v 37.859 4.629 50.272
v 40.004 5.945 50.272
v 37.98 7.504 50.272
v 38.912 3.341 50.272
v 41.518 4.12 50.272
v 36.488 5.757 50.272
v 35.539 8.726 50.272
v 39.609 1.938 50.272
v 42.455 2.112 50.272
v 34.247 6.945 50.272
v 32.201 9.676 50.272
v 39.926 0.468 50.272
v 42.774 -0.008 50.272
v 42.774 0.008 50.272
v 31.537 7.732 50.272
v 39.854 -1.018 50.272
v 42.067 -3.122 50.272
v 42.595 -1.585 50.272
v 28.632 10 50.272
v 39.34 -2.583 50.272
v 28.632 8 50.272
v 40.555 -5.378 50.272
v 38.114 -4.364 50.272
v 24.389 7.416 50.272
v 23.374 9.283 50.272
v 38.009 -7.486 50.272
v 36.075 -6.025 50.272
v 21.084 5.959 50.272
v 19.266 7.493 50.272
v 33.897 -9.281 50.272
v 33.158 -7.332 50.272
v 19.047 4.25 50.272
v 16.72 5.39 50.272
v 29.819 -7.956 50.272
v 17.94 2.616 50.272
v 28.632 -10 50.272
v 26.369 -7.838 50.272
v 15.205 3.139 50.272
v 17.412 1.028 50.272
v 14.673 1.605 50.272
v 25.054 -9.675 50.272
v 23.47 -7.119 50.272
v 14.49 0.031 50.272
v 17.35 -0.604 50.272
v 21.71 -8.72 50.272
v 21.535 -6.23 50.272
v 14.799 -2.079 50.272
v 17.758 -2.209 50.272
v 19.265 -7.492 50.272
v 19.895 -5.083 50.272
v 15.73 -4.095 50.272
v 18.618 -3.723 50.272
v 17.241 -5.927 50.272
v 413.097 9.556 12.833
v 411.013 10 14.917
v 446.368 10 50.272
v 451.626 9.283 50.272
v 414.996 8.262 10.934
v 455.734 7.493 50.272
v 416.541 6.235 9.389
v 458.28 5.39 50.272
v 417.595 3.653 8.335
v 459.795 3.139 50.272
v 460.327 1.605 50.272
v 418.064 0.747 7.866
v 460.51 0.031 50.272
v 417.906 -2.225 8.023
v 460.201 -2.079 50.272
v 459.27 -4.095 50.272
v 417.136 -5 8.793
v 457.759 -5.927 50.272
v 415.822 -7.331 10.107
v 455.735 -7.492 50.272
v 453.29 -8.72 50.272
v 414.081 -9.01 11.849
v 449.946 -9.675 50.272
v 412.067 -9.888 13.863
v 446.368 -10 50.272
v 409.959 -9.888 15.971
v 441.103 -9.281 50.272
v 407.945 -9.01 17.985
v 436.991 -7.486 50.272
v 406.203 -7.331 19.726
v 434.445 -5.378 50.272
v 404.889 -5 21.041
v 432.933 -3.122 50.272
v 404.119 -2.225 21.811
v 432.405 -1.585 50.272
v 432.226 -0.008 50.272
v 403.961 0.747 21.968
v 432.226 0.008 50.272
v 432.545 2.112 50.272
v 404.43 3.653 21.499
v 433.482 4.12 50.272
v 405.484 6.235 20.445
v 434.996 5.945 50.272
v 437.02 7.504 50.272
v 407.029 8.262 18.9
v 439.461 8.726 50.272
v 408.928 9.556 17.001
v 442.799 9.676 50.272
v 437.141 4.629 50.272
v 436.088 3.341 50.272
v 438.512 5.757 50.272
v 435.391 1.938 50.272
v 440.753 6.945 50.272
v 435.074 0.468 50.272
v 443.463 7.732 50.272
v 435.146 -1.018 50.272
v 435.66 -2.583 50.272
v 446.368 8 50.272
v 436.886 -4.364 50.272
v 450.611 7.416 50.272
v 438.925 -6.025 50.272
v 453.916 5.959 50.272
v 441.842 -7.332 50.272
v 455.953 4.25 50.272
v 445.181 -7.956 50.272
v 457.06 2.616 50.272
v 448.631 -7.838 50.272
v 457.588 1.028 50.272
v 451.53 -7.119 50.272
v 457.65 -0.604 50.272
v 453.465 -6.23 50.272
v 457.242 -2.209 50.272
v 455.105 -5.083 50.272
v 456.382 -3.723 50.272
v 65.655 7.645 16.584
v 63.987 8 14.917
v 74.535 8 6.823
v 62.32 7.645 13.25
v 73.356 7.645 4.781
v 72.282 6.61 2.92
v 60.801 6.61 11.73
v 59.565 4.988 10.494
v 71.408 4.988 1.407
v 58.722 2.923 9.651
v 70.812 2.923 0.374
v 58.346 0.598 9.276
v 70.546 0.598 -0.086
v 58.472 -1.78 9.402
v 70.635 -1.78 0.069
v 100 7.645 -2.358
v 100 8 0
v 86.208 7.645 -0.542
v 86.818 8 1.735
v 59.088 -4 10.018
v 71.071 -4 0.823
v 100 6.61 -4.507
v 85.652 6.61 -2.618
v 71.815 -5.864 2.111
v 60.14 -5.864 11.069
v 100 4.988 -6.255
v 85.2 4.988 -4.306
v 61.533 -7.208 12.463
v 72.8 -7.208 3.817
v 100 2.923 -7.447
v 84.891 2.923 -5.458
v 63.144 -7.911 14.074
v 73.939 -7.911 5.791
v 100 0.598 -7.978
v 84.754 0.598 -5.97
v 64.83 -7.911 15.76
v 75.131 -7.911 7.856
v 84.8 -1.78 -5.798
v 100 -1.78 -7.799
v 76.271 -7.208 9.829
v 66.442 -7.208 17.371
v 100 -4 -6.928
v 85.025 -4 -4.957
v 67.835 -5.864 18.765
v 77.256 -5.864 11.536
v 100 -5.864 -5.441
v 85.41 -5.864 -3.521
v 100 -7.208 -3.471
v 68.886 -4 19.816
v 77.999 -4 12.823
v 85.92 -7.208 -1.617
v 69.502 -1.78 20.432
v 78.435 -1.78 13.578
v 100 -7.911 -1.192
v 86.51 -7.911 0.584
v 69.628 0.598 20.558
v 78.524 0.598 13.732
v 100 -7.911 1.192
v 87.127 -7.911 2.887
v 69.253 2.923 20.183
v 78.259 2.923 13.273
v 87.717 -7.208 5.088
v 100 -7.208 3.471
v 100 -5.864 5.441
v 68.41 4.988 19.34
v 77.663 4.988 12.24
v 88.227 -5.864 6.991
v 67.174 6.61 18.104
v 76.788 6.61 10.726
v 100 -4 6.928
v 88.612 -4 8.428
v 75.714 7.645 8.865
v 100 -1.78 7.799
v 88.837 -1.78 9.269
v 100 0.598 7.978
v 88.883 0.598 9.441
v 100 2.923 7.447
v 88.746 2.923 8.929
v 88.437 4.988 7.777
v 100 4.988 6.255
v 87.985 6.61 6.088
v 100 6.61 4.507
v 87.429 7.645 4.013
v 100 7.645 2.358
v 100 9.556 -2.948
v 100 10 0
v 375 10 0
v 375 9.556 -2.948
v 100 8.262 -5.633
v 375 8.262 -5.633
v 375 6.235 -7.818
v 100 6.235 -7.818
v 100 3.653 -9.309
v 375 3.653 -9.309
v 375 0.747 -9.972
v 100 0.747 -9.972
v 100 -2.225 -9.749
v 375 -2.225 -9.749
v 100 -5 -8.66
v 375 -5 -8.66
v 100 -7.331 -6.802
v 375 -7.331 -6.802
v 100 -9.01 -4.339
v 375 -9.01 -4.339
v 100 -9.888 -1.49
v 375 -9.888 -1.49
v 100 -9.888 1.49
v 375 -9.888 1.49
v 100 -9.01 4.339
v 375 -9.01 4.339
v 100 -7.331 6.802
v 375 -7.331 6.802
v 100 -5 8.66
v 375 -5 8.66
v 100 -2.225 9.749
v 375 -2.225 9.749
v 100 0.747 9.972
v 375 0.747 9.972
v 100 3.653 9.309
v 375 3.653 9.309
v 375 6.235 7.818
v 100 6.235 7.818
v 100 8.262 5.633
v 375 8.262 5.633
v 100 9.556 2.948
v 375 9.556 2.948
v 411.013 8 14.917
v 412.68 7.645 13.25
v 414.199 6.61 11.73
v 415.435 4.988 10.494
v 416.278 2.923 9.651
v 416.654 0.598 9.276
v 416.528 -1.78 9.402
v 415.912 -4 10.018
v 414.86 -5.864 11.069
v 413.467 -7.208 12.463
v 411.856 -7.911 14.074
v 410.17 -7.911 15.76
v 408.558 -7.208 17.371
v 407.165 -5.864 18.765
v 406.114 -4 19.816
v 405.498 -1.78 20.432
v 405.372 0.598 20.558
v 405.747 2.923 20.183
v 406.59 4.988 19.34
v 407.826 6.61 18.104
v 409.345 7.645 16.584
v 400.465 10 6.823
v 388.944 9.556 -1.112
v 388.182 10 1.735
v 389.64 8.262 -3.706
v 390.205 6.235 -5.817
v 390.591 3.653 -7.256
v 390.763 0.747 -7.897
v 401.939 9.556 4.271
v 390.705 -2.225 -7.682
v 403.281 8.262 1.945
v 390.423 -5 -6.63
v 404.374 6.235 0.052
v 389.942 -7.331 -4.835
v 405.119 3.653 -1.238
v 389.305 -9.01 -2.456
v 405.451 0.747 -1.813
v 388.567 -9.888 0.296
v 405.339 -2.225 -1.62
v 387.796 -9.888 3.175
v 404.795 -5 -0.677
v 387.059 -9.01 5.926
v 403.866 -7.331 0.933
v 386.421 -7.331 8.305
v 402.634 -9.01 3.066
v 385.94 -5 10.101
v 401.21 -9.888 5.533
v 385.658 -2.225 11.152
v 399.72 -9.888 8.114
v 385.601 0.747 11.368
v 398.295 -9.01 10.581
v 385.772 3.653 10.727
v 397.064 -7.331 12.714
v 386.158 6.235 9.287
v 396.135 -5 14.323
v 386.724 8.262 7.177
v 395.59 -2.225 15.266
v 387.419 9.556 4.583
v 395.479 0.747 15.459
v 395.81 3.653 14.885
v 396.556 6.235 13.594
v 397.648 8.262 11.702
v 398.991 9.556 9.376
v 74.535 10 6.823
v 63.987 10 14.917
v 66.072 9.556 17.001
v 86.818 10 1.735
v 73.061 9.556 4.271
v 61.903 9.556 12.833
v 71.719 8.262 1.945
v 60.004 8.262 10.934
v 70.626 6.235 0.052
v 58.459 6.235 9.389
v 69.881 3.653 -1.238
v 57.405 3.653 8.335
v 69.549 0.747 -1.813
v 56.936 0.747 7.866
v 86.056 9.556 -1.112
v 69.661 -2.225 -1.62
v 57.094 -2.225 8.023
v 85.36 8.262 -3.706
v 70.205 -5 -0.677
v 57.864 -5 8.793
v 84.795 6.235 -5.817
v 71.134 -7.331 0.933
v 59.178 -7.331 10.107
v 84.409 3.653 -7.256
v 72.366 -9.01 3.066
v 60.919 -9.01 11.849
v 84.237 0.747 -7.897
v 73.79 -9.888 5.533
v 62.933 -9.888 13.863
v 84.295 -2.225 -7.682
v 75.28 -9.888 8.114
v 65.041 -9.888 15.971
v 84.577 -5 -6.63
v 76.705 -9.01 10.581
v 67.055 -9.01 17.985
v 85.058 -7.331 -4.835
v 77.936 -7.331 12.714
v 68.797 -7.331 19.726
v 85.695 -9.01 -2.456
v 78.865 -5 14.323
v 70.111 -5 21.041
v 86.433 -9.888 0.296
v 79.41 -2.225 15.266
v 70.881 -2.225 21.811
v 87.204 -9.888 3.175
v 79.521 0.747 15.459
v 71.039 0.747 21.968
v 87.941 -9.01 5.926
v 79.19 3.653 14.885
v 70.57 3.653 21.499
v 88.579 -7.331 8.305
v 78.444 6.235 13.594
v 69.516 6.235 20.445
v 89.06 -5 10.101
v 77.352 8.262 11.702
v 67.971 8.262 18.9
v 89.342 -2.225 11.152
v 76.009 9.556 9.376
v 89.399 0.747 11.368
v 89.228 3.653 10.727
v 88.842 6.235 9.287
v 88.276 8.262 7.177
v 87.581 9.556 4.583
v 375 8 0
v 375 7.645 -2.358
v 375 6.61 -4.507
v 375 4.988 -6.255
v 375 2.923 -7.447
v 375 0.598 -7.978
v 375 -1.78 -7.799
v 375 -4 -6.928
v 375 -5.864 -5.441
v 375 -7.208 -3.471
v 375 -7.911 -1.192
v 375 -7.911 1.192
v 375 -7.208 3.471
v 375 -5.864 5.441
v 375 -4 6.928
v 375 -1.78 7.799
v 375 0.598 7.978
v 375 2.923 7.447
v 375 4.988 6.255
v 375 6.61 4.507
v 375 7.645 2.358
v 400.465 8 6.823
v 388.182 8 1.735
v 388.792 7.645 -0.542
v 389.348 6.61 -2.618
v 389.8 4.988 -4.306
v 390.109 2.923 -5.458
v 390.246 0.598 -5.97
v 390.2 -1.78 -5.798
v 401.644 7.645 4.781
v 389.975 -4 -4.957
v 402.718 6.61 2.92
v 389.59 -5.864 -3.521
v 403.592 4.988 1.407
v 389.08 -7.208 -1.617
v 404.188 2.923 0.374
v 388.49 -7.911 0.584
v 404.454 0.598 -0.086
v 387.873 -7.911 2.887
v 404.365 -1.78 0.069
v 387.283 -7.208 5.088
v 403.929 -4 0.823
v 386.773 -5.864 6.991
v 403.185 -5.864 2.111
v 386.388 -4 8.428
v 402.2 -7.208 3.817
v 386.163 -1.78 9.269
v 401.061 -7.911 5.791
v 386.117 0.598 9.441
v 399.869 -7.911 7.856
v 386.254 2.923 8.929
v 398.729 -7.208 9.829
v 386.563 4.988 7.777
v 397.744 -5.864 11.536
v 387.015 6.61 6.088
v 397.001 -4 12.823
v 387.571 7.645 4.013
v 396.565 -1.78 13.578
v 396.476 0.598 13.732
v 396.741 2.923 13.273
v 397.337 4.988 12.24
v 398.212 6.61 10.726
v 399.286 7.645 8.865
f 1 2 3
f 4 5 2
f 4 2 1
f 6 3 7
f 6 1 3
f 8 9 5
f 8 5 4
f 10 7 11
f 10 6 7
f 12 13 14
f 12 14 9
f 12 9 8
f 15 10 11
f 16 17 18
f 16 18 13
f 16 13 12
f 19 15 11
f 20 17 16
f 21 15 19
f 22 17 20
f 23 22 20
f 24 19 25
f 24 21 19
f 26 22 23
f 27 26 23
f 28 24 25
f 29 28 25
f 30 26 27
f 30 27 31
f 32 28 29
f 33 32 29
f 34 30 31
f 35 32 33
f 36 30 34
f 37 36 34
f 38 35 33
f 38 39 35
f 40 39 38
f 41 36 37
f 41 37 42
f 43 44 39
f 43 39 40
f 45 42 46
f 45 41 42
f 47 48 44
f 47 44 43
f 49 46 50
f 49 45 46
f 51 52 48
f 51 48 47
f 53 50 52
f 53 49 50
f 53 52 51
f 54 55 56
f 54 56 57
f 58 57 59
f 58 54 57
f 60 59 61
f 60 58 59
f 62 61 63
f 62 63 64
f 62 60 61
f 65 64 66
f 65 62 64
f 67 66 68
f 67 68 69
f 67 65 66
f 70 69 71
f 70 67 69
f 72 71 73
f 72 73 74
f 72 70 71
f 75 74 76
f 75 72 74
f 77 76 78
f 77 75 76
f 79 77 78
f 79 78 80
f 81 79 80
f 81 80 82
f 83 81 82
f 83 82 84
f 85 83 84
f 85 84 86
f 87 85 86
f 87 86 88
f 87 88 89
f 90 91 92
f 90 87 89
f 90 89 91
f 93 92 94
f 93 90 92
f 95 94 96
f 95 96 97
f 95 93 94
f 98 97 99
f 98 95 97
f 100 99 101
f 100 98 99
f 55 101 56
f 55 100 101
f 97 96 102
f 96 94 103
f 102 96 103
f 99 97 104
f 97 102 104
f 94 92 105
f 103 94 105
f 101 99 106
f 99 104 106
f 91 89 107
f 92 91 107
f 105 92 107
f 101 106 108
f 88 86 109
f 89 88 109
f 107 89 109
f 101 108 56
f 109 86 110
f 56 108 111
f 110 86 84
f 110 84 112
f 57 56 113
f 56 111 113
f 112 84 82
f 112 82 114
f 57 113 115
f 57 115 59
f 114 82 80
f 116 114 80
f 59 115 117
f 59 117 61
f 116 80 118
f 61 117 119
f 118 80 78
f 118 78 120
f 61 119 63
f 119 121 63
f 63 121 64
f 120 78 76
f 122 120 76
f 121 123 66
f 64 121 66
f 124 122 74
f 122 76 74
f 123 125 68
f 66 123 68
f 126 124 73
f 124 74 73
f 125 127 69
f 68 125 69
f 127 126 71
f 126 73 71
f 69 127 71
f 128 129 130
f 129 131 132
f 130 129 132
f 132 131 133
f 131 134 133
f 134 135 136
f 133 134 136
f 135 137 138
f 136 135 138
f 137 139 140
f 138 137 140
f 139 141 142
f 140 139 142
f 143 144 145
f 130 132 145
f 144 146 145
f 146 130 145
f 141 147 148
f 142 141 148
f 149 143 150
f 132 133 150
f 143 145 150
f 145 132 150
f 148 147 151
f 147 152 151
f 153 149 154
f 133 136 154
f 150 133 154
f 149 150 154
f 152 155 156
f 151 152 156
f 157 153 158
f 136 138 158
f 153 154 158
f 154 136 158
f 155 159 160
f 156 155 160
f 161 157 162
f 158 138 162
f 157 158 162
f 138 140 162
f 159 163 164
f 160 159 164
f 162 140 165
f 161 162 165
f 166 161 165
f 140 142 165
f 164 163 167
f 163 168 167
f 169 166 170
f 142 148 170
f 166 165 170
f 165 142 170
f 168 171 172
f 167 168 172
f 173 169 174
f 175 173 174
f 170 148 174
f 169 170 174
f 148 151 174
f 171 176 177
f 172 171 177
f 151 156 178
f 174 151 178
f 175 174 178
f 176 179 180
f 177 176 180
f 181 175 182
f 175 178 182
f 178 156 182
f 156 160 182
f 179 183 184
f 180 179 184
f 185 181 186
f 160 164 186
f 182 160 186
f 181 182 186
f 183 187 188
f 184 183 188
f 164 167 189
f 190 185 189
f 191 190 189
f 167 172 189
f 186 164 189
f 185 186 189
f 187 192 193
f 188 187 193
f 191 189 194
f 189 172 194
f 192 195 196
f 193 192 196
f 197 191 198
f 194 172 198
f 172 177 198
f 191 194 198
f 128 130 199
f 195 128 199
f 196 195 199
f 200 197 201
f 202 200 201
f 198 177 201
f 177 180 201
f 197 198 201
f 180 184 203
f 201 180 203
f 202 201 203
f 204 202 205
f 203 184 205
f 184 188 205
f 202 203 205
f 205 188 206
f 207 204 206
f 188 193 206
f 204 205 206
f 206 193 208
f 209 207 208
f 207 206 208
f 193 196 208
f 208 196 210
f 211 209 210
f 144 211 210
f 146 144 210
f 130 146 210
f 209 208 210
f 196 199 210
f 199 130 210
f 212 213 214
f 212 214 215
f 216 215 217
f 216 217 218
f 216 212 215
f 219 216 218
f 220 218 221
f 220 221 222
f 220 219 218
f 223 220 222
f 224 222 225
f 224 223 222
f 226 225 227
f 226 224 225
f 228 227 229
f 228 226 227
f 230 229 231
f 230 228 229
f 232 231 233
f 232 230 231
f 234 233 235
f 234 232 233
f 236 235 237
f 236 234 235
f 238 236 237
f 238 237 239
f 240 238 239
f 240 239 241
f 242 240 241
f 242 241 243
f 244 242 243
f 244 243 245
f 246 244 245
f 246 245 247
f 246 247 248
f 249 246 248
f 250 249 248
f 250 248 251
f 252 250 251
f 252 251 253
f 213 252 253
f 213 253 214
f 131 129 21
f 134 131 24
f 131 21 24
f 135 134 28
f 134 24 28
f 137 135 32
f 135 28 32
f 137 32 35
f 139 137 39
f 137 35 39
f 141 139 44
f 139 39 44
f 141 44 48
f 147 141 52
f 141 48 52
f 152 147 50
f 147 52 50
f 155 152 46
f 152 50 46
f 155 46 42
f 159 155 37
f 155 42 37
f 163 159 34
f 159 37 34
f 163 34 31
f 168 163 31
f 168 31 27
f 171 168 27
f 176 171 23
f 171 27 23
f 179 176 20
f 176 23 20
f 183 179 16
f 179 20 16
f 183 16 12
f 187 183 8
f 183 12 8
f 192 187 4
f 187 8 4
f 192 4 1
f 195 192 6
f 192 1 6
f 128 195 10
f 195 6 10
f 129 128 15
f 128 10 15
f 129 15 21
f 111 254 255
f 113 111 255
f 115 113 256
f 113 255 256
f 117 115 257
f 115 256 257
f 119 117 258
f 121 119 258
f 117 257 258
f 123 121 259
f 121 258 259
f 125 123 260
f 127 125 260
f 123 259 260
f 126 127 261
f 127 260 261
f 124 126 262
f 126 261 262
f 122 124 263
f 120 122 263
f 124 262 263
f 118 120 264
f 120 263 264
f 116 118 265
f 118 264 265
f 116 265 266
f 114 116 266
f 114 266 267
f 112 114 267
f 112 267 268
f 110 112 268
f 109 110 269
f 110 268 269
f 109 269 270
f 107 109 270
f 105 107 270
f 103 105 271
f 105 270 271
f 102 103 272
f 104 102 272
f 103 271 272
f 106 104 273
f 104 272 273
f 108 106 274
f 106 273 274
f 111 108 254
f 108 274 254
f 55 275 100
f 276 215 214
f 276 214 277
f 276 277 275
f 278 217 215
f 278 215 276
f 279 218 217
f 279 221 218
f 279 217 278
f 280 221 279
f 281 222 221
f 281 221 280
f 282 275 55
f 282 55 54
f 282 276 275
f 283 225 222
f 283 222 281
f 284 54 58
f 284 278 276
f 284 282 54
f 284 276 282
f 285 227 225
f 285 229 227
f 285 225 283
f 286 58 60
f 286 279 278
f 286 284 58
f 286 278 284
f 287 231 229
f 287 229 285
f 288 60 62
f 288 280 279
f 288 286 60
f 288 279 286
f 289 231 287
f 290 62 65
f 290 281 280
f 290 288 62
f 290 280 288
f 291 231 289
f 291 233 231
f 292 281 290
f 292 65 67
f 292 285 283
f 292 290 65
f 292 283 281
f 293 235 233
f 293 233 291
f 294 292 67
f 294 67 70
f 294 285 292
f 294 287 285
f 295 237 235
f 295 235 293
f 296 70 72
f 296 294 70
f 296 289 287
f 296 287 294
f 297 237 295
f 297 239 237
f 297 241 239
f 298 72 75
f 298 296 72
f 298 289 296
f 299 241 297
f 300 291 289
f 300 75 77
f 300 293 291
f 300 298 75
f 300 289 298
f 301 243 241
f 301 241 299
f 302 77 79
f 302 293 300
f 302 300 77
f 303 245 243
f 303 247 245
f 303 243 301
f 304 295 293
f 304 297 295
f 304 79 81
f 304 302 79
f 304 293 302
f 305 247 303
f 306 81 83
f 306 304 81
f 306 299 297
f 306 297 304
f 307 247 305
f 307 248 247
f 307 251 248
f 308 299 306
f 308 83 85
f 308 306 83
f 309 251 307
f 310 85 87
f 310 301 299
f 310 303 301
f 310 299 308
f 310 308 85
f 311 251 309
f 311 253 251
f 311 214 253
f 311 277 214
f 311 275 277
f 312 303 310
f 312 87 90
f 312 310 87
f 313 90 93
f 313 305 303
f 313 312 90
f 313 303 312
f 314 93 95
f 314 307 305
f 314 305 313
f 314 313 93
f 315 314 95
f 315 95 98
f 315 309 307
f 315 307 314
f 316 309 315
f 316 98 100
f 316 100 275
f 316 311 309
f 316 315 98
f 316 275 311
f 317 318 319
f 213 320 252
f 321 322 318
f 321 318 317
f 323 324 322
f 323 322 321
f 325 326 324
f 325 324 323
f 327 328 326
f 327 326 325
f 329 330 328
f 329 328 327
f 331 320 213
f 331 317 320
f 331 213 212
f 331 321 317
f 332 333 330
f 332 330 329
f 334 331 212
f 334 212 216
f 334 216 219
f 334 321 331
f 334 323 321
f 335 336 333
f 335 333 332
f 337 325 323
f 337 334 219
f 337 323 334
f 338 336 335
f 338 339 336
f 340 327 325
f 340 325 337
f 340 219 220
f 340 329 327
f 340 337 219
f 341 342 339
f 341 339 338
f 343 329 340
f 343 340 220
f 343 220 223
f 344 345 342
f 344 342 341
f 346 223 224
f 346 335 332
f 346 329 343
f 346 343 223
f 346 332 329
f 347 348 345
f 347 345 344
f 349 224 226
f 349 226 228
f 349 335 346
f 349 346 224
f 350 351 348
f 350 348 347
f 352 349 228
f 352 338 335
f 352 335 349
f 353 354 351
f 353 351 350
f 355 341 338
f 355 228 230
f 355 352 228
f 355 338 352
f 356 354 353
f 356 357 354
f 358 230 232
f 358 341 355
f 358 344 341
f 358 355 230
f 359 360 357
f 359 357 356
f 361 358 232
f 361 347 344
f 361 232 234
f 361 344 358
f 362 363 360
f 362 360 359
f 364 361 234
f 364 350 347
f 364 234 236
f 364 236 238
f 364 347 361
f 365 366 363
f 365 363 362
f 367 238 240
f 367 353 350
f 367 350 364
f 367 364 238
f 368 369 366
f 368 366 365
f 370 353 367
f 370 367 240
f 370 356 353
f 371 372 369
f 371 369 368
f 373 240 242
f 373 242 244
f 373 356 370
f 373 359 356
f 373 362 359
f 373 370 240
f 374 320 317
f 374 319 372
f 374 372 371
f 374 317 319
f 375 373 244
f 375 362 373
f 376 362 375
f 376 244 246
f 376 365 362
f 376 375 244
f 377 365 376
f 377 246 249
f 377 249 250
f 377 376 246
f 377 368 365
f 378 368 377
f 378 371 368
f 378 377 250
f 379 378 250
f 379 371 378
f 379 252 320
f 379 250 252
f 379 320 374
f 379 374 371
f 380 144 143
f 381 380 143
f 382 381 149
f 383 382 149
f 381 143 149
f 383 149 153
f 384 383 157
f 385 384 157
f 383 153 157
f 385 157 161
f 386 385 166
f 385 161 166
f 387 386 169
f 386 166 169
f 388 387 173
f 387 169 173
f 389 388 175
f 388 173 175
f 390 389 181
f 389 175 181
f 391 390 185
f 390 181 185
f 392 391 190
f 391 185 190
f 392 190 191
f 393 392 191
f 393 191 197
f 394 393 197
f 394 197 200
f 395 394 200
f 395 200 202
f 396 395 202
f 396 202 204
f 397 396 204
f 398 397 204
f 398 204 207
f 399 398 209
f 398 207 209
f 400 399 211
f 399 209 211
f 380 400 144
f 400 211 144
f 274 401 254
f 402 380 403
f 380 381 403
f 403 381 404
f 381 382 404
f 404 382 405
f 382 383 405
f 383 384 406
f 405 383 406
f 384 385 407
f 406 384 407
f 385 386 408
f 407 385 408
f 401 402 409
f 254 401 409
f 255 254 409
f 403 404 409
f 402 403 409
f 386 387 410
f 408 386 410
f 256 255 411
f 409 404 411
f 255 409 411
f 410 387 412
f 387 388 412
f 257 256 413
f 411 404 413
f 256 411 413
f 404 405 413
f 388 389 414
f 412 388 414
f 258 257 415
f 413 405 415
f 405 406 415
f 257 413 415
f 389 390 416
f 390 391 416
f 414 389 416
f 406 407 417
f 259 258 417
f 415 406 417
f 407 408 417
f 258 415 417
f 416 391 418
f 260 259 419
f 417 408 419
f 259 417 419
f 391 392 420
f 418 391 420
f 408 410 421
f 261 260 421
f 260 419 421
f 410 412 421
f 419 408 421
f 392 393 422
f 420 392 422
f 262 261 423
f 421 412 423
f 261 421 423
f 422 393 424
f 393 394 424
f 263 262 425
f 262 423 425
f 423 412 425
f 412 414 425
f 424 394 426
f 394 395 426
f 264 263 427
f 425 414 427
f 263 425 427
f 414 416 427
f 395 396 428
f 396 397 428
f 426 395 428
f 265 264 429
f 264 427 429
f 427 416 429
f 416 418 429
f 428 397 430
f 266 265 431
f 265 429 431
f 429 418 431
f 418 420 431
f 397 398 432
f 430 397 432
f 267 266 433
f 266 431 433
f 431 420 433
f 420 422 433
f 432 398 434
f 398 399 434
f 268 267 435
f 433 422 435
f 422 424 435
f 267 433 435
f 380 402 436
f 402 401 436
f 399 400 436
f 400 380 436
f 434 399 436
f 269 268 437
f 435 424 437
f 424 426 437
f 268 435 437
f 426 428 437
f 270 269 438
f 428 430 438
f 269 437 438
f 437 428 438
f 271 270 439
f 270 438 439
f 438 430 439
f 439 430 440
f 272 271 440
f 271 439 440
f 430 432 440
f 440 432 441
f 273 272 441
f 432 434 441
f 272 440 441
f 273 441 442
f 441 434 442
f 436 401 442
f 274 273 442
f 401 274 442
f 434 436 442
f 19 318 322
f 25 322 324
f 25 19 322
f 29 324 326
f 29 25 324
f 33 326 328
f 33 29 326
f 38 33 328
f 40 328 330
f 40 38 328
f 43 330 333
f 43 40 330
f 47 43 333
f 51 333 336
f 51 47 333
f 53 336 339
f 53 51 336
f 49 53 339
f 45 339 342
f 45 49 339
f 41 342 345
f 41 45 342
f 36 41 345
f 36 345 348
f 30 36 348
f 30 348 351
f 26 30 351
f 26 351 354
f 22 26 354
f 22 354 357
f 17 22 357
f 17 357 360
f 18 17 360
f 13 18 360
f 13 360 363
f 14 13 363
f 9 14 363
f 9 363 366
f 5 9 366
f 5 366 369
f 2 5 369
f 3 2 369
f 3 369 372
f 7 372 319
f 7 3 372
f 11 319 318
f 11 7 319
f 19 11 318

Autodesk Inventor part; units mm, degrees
ref_plane "YZ Plane" through (0, 0, 0) normal (1, 0, 0) x (0, 1, 0)
ref_plane "XZ Plane" through (0, 0, 0) normal (0, 1, 0) x (-1, 0, 0)
ref_plane "XY Plane" through (0, 0, 0) normal (0, 0, 1) x (1, 0, 0)
sketch "Szkic1" plane through (0, 0, 0) normal (1, 0, 0) x (0, 1, 0)
  circle A0 centre (0, 0) radius 10
  dimension "d0" = 20
extrude "Wyciągnięcie proste1" add sketch "Szkic1" along normal blind 475
shell "Skorupa1" thickness 2 removed faces 2 at (475, -1.182, 3.1167) at (0, -1.182, 3.1167)
sketch "Szkic2" plane through (0, 0, 0) normal (0, 0, 1) x (1, 0, 0)
  line L0 (100, 28.3712) -> (100, -25.6691)
  line L1 (0, 10) -> (0, -10) projected
  point P0 (0, 0)
  dimension "d4" = 100
bend part "Gięcie części1" radius 50.9296 angle 45 line through (100, 28.3712, 0) along (0, -1, 0) centre toward (0, 0, 1) moving side (-1, 0, 0) both sides no
sketch "Szkic3" plane through (0, 0, 0) normal (0, 0, 1) x (1, 0, 0)
  line L0 (375, 37.2706) -> (375, -31.4113)
  line L1 (475, -10) -> (475, 10) projected
  point P0 (0, 0)
  dimension "d7" = 100
bend part "Gięcie części2" radius 50.9296 angle 45 line through (375, 37.2706, 0) along (0, -1, 0) centre toward (0, 0, 1) moving side (1, 0, 0) both sides no
sketch "Szkic4" plane through (0, 0, 0) normal (0, 1, 0) x (-1, 0, 0)
  line L0 (-446.368, 64.4144) -> (-460.5101, 50.2723) construction
  line L1 (-403.9416, 21.988) -> (-446.368, 64.4144) construction
  line L2 (-418.0837, 7.8459) -> (-460.5101, 50.2723) construction
  line L3 (-460.5101, 50.2723) -> (-446.368, 64.4144)
  line L4 (-446.368, 64.4144) -> (-432.2259, 50.2723)
  line L5 (-432.2259, 50.2723) -> (-460.5101, 50.2723)
  line L6 (-14.4899, 50.2723) -> (-28.632, 64.4144) construction
  line L7 (-28.632, 64.4144) -> (-71.0584, 21.988) construction
  line L8 (-14.4899, 50.2723) -> (-56.9163, 7.8459) construction
  line L9 (-14.4899, 50.2723) -> (-28.632, 64.4144)
  line L10 (-28.632, 64.4144) -> (-42.7741, 50.2723)
  line L11 (-42.7741, 50.2723) -> (-14.4899, 50.2723)
  point P0 (0, 0)
extrude "Wyciągnięcie proste2" cut sketch "Szkic4" along normal mid plane 20
equation "\"PromieńGięcia\" = Grubość"
equation "\"SzerokośćGięciaPodcięcia\" = Grubość"
equation "\"GłębokośćGięciaPodcięcia\" = 0.5 * Grubość"
equation "\"RozmiarPodcięciaNarożnika\" = 4 * Grubość"
equation "\"MinimalnaPozostałość\" = 2 * Grubość"
equation "\"PromieńPrzejścia\" = PromieńGięcia"
equation "\"Rozmiar_promienia_Jacobiego\" = PromieńGięcia"
equation "\"Wielk_odstępu\" = Grubość"
equation "\"Grubość\" = 0.5"
properties part number "Rura_barierka_oparcia" material "Aluminium AW-7020"
